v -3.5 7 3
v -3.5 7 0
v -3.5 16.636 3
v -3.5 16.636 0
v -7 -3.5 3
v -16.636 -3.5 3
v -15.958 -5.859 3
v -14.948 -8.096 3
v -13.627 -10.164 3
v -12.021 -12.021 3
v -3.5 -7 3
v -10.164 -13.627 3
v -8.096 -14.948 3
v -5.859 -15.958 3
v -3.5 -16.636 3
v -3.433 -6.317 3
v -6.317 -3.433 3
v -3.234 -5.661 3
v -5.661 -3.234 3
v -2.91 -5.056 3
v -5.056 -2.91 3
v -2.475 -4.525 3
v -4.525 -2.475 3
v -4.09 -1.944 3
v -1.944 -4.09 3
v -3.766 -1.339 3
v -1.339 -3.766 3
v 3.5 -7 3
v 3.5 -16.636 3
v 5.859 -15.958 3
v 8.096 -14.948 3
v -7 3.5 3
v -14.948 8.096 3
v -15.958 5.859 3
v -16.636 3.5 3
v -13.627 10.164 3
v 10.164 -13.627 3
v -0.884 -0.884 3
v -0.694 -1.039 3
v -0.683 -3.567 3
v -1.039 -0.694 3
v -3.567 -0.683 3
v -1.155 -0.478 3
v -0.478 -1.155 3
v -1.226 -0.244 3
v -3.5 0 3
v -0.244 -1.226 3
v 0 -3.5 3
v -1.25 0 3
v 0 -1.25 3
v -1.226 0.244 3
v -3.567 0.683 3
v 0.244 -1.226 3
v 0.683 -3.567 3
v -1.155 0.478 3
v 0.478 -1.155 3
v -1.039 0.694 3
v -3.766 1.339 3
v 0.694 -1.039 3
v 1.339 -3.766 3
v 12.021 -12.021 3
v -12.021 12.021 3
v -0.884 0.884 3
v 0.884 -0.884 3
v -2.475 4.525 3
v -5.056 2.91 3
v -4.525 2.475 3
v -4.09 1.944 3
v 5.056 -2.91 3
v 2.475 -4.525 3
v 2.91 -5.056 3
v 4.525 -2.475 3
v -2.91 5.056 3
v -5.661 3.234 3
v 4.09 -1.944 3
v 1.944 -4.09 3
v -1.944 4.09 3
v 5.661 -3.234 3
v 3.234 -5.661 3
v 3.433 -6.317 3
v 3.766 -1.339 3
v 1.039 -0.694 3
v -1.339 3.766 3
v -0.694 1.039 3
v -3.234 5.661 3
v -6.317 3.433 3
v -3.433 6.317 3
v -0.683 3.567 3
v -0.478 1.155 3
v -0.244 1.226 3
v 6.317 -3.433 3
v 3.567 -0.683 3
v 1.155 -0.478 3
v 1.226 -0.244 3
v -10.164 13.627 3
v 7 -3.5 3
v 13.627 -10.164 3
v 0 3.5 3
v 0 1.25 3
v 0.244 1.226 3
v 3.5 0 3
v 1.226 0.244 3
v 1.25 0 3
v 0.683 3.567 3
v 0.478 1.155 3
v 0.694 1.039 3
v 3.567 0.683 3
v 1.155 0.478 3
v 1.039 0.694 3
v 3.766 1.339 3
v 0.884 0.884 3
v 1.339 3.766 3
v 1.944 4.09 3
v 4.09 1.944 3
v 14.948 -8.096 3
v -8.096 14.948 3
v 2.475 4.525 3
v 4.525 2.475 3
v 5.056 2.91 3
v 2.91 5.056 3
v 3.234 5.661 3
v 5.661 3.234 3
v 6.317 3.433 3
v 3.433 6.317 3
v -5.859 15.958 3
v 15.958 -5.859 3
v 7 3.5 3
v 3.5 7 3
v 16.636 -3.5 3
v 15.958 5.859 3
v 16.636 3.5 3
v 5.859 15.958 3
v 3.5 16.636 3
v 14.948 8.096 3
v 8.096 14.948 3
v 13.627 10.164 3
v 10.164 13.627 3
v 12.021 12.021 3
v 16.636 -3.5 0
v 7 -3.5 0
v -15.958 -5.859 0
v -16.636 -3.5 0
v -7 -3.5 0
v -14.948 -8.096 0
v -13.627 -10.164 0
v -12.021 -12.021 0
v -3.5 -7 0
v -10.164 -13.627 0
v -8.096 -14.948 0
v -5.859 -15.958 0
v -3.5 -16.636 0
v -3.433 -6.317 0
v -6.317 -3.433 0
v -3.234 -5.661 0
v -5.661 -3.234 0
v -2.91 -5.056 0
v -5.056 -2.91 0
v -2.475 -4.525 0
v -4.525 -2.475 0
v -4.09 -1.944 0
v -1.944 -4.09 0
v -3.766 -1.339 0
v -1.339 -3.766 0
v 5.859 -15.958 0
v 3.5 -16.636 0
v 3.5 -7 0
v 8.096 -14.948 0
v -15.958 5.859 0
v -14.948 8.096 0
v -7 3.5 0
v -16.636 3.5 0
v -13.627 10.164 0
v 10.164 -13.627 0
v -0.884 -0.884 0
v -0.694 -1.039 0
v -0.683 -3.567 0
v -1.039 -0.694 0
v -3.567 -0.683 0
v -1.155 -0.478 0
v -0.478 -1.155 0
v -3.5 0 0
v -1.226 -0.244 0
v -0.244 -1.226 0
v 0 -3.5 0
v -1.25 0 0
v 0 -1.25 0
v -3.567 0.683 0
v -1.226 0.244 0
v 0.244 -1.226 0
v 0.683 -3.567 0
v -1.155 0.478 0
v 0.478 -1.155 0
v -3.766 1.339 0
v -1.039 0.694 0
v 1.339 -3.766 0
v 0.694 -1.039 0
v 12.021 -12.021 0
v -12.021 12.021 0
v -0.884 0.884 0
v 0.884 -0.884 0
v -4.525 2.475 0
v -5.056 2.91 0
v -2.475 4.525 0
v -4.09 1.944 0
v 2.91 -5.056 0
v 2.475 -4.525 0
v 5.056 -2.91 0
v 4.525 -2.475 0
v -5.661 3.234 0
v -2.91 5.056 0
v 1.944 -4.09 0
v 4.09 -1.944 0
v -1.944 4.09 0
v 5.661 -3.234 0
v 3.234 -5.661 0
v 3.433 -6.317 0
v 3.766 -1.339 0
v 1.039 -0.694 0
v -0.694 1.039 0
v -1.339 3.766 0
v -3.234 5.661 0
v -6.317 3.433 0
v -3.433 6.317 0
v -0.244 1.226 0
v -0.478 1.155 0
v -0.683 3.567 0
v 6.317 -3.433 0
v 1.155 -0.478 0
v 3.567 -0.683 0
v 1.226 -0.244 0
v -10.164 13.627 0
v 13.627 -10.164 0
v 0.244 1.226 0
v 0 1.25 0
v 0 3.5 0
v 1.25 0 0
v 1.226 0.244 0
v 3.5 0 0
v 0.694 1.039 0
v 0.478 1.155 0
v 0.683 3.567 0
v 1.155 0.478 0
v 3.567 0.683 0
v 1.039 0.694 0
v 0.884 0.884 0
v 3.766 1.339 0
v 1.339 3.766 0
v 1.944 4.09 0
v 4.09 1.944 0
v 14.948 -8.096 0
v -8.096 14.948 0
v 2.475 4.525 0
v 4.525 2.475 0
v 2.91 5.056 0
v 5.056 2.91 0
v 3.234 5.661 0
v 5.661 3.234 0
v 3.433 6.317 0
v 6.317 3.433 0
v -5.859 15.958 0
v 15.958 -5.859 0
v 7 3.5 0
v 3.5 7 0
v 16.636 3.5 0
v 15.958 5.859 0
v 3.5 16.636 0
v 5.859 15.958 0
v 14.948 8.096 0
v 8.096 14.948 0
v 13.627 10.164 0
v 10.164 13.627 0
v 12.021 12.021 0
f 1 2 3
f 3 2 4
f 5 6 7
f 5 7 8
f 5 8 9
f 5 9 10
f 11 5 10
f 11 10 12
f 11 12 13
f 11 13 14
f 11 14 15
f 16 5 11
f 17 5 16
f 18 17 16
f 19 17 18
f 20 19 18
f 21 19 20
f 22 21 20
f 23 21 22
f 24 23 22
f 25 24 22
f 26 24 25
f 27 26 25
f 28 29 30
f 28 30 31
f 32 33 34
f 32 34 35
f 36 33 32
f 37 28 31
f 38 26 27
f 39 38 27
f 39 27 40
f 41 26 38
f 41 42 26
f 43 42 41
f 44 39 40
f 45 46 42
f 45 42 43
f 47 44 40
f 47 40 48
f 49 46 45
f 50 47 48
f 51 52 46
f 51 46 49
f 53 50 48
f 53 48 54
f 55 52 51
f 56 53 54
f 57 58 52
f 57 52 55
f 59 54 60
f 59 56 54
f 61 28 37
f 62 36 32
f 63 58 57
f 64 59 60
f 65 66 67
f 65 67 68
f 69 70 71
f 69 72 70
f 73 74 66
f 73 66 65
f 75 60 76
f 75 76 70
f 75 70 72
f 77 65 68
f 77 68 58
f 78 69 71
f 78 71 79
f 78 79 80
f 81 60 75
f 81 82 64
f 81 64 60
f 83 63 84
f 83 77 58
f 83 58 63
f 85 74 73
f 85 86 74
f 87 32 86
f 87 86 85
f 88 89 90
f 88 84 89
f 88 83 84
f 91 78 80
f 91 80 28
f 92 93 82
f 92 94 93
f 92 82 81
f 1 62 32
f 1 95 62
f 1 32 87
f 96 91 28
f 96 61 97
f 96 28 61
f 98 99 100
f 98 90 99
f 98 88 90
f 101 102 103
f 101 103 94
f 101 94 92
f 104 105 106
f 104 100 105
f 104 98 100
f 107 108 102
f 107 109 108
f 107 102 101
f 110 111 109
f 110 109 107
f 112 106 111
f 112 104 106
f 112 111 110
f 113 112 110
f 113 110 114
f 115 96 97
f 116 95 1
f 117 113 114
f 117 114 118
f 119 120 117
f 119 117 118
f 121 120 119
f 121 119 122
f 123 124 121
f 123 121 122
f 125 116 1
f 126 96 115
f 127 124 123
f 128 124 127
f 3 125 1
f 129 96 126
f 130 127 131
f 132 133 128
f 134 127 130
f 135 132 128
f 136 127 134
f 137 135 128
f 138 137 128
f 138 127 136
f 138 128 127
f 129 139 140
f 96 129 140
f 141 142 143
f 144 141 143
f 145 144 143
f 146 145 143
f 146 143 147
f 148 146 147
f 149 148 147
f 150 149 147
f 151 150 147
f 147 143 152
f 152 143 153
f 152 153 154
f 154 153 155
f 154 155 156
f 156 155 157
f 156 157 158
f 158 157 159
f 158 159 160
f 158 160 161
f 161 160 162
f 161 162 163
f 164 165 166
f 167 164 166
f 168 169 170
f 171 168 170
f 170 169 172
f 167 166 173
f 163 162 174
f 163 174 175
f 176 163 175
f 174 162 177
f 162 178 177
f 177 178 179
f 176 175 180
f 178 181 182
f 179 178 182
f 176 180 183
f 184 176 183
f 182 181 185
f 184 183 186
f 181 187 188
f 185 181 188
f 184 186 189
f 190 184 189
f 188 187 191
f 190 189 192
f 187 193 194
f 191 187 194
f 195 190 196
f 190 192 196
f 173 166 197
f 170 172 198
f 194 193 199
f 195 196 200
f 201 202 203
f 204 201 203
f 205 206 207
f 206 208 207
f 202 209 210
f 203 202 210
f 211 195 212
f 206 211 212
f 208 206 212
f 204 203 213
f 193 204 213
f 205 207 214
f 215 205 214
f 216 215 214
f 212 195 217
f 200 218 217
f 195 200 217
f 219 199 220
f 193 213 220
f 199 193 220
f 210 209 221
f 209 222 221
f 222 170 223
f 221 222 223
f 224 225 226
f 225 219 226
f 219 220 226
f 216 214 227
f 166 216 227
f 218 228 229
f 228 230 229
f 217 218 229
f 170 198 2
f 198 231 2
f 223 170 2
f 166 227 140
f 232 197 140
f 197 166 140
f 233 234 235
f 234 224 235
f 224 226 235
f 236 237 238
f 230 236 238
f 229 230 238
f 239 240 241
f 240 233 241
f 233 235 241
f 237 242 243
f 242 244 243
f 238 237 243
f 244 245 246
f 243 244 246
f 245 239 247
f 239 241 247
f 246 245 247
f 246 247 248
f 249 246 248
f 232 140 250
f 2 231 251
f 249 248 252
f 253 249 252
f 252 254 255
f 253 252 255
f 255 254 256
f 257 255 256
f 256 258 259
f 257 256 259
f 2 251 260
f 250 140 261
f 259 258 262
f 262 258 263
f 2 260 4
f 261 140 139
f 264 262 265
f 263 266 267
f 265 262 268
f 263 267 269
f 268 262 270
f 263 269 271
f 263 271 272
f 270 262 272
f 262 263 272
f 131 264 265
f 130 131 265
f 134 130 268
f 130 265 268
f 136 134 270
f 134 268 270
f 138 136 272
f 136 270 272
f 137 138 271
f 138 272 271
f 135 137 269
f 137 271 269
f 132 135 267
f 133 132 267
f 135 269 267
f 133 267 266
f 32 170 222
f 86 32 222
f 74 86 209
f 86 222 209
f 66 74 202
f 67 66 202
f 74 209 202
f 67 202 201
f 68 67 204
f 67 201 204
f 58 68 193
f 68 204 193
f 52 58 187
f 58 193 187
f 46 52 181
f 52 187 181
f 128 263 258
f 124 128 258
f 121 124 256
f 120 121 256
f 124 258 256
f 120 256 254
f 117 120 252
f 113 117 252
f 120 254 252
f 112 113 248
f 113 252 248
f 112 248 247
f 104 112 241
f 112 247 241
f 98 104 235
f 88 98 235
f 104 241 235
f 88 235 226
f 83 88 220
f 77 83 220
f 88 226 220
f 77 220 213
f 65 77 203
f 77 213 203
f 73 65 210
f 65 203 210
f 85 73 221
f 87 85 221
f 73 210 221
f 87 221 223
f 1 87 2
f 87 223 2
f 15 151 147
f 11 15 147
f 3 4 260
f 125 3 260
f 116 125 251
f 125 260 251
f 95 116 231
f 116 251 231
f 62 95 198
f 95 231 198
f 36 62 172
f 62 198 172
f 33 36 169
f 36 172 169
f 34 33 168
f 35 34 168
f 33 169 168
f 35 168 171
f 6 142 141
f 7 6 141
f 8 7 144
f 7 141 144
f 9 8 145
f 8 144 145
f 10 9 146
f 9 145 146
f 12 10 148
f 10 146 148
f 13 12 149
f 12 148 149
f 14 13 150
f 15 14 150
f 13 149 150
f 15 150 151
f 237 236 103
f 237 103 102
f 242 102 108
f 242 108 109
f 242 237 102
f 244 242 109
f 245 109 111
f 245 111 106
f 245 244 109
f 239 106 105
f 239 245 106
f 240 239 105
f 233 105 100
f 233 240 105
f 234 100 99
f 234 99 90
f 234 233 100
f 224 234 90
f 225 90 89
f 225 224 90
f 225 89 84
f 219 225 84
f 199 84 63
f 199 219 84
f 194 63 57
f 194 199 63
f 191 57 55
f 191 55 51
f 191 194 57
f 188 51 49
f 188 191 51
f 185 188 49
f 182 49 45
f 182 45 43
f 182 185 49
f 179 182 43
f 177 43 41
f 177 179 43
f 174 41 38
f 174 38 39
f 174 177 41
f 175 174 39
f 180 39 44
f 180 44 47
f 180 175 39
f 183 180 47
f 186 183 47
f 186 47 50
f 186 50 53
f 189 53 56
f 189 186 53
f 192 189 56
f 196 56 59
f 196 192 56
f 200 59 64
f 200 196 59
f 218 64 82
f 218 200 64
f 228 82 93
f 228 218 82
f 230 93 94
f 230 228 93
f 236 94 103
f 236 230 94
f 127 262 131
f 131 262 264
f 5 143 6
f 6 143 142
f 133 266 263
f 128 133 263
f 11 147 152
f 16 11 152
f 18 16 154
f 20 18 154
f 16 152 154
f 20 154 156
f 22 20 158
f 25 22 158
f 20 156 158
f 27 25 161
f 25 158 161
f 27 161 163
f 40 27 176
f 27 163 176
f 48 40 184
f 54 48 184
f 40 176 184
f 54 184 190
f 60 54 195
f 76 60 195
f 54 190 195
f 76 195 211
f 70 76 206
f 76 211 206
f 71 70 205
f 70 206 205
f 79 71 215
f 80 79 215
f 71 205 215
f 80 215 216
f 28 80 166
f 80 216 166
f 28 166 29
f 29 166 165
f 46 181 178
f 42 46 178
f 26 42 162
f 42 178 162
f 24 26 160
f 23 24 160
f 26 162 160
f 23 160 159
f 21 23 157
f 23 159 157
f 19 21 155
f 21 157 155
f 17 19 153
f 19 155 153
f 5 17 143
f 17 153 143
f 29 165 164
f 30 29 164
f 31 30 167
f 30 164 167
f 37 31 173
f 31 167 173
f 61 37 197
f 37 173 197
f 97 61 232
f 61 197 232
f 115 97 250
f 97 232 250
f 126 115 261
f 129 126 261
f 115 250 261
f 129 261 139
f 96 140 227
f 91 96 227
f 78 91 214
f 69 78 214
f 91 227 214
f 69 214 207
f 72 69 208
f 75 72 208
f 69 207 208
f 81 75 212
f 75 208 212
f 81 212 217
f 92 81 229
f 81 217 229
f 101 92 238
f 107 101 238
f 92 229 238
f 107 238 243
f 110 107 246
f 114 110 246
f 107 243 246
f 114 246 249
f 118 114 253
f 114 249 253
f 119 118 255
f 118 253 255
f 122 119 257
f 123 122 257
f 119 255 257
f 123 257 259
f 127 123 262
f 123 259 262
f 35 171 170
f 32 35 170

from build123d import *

# Parameters (mm, degrees)
SKETCH_1_R      = 1.25
EXTRUDE_1_DEPTH = 3


with BuildPart() as part:
    # 草图1 → 凸台-拉伸1 (new body)
    with BuildSketch(Plane.XY):
        with BuildLine():
            ThreePointArc((3.5, 7), (0, 3.5), (-3.5, 7))
            Line((-3.5, 7), (-3.5, 16.63580476))
            ThreePointArc((-3.5, 16.63580476), (-12.02081528, 12.02081528), (-16.63580476, 3.5))
            Line((-16.63580476, 3.5), (-7, 3.5))
            ThreePointArc((-7, 3.5), (-4.525126266, 2.474873734), (-3.5, 0))
            ThreePointArc((-3.5, 0), (-4.525126266, -2.474873734), (-7, -3.5))
            Line((-7, -3.5), (-16.63580476, -3.5))
            ThreePointArc((-16.63580476, -3.5), (-12.02081528, -12.02081528), (-3.5, -16.63580476))
            Line((-3.5, -16.63580476), (-3.5, -7))
            ThreePointArc((-3.5, -7), (0, -3.5), (3.5, -7))
            Line((3.5, -7), (3.5, -16.63580476))
            ThreePointArc((3.5, -16.63580476), (12.02081528, -12.02081528), (16.63580476, -3.5))
            Line((16.63580476, -3.5), (7, -3.5))
            ThreePointArc((7, -3.5), (3.5, 0), (7, 3.5))
            Line((7, 3.5), (16.63580476, 3.5))
            ThreePointArc((16.63580476, 3.5), (12.02081528, 12.02081528), (3.5, 16.63580476))
            Line((3.5, 16.63580476), (3.5, 7))
        make_face()
        Circle(SKETCH_1_R, mode=Mode.SUBTRACT)
    extrude(amount=EXTRUDE_1_DEPTH)


solid = part.part
